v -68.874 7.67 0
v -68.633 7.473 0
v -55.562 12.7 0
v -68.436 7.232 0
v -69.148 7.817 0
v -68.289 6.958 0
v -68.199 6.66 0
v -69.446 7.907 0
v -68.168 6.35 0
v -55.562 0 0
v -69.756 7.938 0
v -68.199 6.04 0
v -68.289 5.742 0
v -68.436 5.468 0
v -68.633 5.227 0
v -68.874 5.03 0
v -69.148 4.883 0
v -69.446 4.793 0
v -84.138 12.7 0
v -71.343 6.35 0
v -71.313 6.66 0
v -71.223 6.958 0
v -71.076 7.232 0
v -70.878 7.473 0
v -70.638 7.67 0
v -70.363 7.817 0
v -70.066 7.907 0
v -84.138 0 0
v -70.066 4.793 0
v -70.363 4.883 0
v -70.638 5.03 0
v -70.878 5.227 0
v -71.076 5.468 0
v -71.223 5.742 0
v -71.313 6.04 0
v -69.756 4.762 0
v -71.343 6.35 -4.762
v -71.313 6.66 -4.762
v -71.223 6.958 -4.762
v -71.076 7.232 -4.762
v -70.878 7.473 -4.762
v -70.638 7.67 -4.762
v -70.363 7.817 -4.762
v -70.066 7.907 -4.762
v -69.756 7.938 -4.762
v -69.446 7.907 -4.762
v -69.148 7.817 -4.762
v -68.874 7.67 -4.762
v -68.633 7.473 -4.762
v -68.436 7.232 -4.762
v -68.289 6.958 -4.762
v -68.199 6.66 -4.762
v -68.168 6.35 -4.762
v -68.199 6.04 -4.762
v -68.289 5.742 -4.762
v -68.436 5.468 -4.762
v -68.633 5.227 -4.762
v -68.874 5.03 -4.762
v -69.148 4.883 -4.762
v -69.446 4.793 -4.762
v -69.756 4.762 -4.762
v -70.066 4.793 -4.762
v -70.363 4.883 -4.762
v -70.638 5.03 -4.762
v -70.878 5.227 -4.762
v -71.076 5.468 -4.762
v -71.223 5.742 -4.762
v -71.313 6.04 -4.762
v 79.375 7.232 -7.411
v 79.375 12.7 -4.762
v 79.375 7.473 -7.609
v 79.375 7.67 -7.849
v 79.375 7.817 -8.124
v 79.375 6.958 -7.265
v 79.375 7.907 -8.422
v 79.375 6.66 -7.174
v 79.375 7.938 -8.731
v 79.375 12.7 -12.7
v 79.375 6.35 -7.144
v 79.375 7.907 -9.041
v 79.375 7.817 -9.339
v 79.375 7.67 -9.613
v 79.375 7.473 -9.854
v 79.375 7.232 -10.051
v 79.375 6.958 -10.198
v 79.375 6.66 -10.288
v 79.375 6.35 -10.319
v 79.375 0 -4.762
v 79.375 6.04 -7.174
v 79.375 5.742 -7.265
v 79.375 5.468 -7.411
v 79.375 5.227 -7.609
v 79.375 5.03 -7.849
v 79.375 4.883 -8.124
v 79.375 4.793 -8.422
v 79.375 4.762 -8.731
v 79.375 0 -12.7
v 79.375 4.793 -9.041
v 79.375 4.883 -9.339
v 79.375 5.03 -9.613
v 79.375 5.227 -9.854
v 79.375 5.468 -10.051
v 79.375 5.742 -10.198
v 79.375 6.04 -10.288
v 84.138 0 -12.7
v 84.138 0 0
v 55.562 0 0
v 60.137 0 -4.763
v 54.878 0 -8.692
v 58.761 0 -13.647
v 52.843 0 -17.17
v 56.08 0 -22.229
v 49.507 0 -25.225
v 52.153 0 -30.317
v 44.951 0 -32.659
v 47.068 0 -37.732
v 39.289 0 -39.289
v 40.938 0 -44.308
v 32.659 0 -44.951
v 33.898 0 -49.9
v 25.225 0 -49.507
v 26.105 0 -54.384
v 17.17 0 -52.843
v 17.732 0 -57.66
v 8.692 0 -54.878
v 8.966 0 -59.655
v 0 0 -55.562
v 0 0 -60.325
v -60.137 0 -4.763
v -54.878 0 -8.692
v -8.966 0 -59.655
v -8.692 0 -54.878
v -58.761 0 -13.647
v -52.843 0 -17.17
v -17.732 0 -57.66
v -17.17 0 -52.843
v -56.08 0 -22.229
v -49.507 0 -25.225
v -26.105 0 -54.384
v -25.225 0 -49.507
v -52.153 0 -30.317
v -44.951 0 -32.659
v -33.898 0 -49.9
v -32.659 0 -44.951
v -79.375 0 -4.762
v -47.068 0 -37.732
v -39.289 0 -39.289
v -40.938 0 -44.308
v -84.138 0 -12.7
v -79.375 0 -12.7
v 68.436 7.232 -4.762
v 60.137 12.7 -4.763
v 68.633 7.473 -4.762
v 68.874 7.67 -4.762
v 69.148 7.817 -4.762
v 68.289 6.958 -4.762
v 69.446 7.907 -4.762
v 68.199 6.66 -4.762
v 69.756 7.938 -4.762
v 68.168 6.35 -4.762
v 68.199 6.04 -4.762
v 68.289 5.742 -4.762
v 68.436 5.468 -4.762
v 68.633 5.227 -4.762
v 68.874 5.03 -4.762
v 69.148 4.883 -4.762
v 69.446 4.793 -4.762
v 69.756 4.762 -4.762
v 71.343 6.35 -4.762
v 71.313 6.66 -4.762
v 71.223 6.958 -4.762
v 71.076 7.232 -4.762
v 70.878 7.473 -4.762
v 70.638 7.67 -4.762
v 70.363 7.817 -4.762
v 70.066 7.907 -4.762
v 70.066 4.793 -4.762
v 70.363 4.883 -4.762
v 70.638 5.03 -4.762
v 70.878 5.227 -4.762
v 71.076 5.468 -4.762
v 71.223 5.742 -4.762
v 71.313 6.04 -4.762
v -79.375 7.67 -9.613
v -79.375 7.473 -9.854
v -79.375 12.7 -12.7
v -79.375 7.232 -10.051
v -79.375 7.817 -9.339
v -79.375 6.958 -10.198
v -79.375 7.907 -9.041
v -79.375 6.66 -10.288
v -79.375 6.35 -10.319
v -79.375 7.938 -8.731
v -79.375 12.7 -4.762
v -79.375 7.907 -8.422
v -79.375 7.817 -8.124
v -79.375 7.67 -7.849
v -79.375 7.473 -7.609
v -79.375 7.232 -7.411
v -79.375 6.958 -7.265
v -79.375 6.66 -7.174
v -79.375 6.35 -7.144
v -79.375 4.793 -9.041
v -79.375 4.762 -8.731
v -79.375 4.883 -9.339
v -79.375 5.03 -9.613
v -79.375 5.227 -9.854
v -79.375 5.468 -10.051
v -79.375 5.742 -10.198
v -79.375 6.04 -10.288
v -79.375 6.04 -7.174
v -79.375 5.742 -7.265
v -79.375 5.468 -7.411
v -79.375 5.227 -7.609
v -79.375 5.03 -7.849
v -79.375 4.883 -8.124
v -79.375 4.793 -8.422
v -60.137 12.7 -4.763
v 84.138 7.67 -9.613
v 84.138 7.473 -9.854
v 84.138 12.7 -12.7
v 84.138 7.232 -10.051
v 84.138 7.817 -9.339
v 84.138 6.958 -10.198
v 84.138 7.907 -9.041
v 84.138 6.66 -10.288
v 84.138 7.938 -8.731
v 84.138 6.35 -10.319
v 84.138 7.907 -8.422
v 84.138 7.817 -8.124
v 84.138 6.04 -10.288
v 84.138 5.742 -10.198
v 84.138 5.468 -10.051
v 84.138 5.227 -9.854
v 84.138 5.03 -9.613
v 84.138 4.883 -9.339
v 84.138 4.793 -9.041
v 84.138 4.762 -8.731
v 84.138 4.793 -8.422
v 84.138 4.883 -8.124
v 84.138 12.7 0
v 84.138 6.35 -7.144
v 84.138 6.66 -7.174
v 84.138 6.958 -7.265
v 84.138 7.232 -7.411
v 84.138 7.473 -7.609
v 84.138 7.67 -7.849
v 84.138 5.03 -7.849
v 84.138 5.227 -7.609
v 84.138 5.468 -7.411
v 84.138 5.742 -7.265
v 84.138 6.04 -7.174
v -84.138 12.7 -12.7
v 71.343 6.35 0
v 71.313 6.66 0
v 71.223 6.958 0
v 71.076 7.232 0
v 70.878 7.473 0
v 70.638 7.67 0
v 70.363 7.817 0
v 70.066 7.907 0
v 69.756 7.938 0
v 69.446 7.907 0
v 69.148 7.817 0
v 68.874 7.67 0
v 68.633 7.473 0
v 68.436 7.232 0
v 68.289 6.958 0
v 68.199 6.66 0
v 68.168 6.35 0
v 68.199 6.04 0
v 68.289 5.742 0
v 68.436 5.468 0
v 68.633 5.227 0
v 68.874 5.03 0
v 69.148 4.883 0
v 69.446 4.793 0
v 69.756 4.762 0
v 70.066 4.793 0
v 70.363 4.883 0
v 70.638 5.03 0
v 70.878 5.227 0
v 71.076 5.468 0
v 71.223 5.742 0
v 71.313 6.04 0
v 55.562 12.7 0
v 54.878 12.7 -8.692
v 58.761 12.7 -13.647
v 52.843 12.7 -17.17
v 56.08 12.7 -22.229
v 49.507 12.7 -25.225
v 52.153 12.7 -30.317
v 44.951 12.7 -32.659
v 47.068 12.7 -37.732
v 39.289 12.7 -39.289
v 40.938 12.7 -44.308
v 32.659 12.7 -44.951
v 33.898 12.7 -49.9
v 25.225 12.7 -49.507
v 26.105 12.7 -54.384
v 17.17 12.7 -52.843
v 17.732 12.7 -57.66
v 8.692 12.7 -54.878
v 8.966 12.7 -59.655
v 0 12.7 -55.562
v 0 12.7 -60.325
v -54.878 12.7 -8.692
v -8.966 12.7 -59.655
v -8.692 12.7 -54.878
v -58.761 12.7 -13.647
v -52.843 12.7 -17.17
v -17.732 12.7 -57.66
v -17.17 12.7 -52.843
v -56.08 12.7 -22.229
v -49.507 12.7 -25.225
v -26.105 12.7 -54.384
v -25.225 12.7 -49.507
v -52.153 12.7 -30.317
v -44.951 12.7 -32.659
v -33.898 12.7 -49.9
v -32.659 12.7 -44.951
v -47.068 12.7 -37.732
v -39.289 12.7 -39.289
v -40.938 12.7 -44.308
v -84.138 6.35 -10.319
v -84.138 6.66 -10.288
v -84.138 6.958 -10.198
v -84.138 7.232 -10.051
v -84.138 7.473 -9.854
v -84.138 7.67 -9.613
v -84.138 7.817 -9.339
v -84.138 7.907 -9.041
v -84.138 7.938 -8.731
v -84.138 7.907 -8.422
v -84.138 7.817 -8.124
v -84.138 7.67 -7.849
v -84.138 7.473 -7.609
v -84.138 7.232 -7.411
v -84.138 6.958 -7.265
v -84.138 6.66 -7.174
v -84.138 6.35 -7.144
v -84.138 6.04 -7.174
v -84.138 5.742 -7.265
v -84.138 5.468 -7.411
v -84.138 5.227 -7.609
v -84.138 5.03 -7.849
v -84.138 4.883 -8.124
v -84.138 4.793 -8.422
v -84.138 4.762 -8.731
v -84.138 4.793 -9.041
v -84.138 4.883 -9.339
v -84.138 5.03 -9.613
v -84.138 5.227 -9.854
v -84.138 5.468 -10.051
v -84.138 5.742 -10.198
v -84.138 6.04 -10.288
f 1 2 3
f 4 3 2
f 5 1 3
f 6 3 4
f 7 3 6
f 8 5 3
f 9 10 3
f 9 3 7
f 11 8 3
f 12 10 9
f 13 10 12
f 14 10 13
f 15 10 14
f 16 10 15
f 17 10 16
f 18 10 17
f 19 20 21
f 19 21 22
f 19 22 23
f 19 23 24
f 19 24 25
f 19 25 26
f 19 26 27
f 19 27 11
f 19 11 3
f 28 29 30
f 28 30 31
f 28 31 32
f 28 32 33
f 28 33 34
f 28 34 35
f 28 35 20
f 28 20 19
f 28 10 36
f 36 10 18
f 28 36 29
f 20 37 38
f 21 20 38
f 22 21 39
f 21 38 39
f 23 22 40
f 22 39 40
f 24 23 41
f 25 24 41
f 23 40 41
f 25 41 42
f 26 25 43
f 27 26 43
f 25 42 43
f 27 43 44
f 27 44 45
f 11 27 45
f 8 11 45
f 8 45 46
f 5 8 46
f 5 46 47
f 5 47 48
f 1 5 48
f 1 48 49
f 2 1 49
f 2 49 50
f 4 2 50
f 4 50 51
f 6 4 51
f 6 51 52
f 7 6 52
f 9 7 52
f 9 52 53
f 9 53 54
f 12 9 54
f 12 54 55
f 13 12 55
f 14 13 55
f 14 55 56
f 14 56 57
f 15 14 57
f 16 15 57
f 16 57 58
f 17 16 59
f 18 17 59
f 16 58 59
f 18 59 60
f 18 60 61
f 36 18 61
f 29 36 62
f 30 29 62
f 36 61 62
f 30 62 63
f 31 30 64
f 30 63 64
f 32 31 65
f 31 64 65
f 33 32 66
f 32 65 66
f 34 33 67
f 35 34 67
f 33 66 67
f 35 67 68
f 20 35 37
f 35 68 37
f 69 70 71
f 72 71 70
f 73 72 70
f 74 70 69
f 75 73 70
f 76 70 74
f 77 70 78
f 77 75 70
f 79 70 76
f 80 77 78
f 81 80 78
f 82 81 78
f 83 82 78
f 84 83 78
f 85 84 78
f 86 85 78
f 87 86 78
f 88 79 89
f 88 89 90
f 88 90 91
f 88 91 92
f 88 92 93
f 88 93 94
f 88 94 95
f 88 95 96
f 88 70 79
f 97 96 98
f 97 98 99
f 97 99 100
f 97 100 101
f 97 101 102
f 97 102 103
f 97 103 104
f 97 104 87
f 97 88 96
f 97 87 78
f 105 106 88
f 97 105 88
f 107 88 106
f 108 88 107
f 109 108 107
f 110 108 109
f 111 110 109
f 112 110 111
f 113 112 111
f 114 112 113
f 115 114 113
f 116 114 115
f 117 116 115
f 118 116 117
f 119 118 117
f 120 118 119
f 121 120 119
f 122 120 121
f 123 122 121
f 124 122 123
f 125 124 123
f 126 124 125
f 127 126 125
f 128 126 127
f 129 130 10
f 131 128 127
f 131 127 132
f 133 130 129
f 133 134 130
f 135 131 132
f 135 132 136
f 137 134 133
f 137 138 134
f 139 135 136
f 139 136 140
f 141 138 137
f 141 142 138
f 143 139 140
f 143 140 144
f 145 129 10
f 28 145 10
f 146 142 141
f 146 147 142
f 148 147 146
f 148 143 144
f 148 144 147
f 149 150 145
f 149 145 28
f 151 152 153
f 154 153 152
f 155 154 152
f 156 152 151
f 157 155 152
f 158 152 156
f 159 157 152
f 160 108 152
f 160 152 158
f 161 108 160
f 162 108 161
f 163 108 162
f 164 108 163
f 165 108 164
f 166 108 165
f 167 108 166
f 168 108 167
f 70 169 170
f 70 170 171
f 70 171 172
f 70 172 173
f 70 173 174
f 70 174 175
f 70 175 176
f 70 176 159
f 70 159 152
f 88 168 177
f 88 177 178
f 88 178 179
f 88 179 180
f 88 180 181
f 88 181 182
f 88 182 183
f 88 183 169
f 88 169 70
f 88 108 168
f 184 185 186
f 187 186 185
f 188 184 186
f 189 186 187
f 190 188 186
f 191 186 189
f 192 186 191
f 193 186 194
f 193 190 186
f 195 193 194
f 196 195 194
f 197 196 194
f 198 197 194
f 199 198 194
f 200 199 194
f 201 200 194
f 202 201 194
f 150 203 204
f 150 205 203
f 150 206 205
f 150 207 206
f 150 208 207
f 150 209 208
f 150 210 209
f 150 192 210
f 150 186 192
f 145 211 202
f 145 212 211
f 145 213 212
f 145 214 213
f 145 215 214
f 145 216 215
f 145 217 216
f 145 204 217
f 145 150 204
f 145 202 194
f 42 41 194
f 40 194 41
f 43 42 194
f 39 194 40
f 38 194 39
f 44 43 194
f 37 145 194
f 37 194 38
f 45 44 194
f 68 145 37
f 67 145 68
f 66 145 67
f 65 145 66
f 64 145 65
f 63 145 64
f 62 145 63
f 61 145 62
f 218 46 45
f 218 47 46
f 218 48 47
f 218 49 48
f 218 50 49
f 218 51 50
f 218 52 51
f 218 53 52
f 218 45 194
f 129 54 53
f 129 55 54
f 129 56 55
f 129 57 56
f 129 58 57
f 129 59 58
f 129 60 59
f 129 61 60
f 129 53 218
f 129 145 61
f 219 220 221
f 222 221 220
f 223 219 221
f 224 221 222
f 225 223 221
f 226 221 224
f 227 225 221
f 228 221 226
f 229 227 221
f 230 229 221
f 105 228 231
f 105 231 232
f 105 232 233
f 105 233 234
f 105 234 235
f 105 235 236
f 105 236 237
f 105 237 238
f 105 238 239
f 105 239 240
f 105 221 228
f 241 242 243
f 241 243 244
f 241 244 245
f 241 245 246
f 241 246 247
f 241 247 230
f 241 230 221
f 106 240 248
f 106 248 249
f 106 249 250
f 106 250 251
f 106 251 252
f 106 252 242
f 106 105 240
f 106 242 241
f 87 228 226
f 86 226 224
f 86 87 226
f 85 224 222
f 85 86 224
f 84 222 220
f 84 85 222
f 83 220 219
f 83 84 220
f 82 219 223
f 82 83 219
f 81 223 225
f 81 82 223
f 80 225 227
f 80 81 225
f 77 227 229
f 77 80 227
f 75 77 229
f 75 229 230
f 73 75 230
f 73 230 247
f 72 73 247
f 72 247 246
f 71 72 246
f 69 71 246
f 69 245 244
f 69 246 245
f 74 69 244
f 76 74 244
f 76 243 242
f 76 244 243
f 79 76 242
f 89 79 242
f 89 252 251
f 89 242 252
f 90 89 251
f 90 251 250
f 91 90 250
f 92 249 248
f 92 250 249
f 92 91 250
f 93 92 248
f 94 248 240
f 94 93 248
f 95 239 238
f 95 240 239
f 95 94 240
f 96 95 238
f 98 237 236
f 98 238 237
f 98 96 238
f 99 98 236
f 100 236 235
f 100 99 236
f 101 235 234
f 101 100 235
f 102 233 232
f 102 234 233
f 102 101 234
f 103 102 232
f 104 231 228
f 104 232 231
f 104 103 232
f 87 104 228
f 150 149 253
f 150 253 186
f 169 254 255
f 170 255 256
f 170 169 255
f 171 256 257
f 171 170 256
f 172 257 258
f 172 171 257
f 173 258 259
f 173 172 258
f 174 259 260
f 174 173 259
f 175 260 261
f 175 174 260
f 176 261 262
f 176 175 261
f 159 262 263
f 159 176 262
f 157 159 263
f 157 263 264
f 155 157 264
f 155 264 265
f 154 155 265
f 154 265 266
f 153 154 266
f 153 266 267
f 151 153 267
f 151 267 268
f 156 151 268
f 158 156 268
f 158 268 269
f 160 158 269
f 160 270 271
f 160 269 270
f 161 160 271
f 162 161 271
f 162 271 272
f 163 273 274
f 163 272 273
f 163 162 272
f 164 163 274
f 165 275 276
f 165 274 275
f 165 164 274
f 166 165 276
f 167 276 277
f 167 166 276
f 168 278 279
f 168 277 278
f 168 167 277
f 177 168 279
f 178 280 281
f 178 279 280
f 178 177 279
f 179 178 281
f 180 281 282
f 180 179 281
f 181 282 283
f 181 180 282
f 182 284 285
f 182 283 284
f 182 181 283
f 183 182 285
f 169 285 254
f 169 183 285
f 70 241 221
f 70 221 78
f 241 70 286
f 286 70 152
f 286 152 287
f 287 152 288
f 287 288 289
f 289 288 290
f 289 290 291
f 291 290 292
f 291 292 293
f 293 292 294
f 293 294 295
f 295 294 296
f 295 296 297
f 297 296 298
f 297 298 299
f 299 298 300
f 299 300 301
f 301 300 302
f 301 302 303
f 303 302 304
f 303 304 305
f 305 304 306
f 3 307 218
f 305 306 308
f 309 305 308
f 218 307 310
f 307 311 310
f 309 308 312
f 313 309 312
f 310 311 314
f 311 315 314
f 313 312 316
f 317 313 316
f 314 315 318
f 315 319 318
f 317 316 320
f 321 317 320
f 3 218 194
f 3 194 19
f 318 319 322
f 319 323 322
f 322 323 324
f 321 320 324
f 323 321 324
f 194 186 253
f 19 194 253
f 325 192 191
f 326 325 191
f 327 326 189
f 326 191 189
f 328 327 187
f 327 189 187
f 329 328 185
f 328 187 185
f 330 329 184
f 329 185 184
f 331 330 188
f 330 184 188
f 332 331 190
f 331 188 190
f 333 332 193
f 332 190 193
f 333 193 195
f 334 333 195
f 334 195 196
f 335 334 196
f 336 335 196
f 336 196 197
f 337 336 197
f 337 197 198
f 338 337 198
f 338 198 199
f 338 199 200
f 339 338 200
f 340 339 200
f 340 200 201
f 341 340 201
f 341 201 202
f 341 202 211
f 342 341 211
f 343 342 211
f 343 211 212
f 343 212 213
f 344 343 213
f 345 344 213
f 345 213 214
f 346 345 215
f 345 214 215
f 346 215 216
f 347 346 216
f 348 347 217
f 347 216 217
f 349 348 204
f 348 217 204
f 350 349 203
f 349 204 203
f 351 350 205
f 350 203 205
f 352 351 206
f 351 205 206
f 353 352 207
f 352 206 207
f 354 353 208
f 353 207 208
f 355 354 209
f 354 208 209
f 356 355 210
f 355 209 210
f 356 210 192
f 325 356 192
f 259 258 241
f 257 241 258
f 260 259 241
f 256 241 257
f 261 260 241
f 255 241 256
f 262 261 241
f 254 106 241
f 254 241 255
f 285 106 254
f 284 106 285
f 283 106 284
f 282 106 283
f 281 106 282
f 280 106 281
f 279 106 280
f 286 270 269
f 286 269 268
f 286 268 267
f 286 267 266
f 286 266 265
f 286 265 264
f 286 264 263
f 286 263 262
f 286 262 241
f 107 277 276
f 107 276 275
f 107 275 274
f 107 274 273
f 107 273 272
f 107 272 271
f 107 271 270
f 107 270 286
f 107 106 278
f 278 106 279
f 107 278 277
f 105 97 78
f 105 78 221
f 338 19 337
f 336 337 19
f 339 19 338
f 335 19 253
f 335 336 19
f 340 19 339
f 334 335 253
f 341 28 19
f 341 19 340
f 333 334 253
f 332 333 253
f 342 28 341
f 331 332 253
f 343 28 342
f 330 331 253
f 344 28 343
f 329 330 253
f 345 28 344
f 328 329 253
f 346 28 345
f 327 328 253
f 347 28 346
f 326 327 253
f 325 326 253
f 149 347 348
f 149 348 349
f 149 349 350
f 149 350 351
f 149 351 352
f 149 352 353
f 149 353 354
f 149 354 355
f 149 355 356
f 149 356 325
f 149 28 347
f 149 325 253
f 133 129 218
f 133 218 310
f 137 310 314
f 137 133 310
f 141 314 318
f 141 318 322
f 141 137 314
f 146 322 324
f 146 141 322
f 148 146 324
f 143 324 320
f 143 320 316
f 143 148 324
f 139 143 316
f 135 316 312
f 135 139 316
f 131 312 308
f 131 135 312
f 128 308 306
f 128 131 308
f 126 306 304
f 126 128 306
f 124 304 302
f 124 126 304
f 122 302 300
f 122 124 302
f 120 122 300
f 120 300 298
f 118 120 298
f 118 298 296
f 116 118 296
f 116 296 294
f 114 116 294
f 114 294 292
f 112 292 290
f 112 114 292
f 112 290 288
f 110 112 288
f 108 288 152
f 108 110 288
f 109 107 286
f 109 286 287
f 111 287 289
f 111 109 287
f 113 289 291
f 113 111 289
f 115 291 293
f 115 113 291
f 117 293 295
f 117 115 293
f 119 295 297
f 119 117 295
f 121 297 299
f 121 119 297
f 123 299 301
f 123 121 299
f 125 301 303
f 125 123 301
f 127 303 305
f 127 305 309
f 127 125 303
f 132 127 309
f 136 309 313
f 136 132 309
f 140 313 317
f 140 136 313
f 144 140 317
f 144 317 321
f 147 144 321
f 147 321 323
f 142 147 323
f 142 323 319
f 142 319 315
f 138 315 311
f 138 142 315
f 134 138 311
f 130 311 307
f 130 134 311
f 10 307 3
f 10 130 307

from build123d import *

# Parameters (mm, degrees)
BOSS_EXTRUDE1_DEPTH = 12.7
SKETCH5_R           = 1.5875
CUT_EXTRUDE1_DEPTH  = 5.7625
SKETCH6_R           = 1.5875
CUT_EXTRUDE2_DEPTH  = 5.7625


with BuildPart() as part:
    # Sketch1 → Boss-Extrude1 (new body)
    with BuildSketch(Plane(origin=(0, 0, 0), x_dir=(1, 0, 0), z_dir=(0, 1, 0))):
        with BuildLine():
            Line((-55.5625, 0), (-84.1375, 0))
            Line((-84.1375, 0), (-84.1375, 12.7))
            Line((-84.1375, 12.7), (-79.375, 12.7))
            Line((-79.375, 12.7), (-79.375, 4.7625))
            Line((-79.375, 4.7625), (-60.136712736, 4.7625))
            ThreePointArc((-60.136712736, 4.7625), (0, 60.325), (60.136712736, 4.7625))
            Line((60.136712736, 4.7625), (79.375, 4.7625))
            Line((79.375, 4.7625), (79.375, 12.7))
            Line((79.375, 12.7), (84.1375, 12.7))
            Line((84.1375, 12.7), (84.1375, 0))
            Line((84.1375, 0), (55.5625, 0))
            ThreePointArc((55.5625, 0), (0, 55.5625), (-55.5625, 0))
        make_face()
    extrude(amount=BOSS_EXTRUDE1_DEPTH)

    # Sketch5 → Cut-Extrude1 (cut, through all)
    with BuildSketch(Plane(origin=(0, 0, -4.7625), x_dir=(-1, 0, 0), z_dir=(0, 0, -1))):
        with Locations((69.755856368, 6.35)):
            Circle(SKETCH5_R)
    cut_extrude1 = extrude(amount=-CUT_EXTRUDE1_DEPTH, mode=Mode.SUBTRACT)

    # Sketch6 → Cut-Extrude2 (cut, through all)
    with BuildSketch(Plane(origin=(-79.375, 0, 0), x_dir=(0, 0, -1), z_dir=(1, 0, 0))):
        with Locations((8.73125, 6.35)):
            Circle(SKETCH6_R)
    cut_extrude2 = extrude(amount=-CUT_EXTRUDE2_DEPTH, mode=Mode.SUBTRACT)

    # Mirror2: Cut-Extrude1, Cut-Extrude2 across plane
    add(cut_extrude1.mirror(Plane(origin=(0, 0, 0), x_dir=(0, 0, 1), z_dir=(1, 0, 0))), mode=Mode.SUBTRACT)
    add(cut_extrude2.mirror(Plane(origin=(0, 0, 0), x_dir=(0, 0, 1), z_dir=(1, 0, 0))), mode=Mode.SUBTRACT)


solid = part.part
